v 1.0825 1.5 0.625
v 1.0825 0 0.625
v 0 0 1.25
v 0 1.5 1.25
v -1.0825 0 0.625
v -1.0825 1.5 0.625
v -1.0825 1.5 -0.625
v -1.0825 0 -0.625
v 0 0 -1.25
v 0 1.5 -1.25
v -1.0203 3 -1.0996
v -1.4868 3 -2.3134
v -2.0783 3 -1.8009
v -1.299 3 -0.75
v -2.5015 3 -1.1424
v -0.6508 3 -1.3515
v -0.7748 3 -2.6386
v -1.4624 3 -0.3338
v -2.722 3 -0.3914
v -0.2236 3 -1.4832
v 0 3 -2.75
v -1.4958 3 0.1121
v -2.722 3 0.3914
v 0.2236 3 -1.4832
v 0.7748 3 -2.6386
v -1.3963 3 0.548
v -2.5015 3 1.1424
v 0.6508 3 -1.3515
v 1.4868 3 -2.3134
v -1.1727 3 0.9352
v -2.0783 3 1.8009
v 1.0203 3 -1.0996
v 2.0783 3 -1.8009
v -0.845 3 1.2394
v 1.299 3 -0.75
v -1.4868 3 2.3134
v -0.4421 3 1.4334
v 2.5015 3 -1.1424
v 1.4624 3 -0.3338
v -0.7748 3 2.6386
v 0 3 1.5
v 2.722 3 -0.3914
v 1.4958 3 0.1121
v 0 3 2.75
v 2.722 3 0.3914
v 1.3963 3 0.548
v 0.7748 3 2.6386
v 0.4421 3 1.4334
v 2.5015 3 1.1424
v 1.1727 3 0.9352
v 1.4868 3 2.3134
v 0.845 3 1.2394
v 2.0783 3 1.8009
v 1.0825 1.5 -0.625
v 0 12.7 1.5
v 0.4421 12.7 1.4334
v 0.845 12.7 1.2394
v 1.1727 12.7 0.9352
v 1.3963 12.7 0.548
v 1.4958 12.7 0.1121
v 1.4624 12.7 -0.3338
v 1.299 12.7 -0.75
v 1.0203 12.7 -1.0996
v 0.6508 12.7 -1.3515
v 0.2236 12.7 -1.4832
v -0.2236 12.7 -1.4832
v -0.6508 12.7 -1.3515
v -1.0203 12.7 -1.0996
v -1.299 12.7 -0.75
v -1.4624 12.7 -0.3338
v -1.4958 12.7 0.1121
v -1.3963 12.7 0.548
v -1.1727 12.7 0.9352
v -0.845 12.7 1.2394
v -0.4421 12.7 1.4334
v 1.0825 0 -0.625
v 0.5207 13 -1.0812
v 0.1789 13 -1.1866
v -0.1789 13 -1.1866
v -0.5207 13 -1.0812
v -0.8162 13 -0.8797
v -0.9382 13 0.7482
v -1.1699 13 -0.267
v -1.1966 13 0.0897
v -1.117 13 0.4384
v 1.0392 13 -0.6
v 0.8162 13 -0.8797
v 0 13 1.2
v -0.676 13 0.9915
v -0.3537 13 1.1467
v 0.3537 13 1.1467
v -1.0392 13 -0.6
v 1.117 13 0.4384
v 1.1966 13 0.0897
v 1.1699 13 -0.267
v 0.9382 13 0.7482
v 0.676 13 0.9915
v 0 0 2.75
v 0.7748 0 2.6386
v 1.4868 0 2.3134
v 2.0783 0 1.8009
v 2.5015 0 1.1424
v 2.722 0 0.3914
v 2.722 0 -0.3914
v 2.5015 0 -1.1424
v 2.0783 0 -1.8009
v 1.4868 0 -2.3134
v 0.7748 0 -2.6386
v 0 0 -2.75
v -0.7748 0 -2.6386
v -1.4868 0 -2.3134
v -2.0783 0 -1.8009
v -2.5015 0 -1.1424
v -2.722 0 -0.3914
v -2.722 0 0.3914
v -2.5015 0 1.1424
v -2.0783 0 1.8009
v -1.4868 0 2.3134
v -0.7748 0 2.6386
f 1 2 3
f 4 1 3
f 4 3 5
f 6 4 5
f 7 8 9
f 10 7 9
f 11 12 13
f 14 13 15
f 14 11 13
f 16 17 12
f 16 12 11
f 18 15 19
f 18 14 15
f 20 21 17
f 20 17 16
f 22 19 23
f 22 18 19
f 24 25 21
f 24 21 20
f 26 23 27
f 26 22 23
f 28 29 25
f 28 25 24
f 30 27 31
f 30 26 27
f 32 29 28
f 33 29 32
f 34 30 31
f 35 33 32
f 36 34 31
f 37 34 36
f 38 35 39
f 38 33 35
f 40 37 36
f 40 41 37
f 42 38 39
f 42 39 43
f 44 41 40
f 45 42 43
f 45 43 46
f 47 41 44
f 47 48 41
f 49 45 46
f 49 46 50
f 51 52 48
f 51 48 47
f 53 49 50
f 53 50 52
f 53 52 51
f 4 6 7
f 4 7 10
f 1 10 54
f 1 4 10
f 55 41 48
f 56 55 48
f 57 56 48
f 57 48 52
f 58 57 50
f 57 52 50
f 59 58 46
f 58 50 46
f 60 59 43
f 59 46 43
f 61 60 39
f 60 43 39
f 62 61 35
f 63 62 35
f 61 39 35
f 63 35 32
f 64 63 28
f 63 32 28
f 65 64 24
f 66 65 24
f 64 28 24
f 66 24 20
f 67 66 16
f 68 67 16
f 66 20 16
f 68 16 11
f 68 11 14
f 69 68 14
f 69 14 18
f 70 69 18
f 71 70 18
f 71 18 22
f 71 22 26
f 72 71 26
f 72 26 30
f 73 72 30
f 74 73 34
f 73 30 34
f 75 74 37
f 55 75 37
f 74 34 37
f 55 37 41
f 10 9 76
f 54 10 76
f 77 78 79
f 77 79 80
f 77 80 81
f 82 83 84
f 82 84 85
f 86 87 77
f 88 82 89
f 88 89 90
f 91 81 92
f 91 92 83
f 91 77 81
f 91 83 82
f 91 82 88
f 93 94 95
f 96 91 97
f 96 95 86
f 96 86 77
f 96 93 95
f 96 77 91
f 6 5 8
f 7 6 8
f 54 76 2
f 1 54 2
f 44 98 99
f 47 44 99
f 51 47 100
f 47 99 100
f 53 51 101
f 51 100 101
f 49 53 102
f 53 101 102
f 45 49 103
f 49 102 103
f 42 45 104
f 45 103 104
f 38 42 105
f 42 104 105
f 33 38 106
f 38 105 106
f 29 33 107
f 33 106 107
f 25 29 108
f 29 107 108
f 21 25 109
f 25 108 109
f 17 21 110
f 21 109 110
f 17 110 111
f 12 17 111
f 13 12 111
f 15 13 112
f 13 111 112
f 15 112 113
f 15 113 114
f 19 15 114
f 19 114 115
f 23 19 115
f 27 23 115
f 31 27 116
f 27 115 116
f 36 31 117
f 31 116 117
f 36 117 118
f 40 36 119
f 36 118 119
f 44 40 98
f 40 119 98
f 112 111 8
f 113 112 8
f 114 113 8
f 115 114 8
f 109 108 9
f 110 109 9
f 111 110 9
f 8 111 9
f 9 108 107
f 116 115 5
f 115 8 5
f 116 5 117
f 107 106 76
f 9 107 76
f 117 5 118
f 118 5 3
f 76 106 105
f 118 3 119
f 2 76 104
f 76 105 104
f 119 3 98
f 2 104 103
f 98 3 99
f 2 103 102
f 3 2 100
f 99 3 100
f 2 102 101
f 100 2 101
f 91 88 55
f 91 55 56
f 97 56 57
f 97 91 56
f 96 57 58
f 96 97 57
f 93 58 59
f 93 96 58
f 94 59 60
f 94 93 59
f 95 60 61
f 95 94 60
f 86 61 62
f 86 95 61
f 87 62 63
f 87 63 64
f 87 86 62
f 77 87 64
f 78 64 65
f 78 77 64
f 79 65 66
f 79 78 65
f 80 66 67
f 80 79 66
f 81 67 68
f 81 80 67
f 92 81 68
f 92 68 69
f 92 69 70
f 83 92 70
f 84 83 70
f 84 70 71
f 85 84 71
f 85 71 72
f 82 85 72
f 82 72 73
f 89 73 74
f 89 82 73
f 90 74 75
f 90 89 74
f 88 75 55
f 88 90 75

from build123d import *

# Parameters (mm, degrees)
SKETCH_1_R          = 2.75
EXTRUDE_1_DEPTH     = 3
CUT_EXTRUDE_1_DEPTH = 1.5
SKETCH_2_R          = 1.5
EXTRUDE_2_DEPTH     = 10
CHAMFER_1_SIZE      = 0.3


with BuildPart() as part:
    # 草图1 → 凸台-拉伸1 (new body)
    with BuildSketch(Plane(origin=(0, 0, 0), x_dir=(1, 0, 0), z_dir=(0, 1, 0))):
        with Locations(Location((0, 0, 0), (0, 0, 270))):
            Circle(SKETCH_1_R)
    extrude(amount=EXTRUDE_1_DEPTH)

    # 草图3 → 切除-拉伸1 (cut)
    with BuildSketch(Plane.XZ):
        Polygon((0, 1.25), (-1.082531755, 0.625), (-1.082531755, -0.625), (0, -1.25), (1.082531755, -0.625), (1.082531755, 0.625), align=None)
    extrude(amount=-CUT_EXTRUDE_1_DEPTH, mode=Mode.SUBTRACT)

    # 草图2 → 凸台-拉伸2 (add)
    with BuildSketch(Plane(origin=(0, 3, 0), x_dir=(1, 0, 0), z_dir=(0, 1, 0))):
        with Locations(Location((0, 0, 0), (0, 0, 270))):
            Circle(SKETCH_2_R)
    extrude(amount=EXTRUDE_2_DEPTH)

    # 倒角1
    chamfer_1_edges = [part.edges().sort_by_distance(p)[0] for p in [
        (0, 13, -1.5),
    ]]
    chamfer(chamfer_1_edges, length=CHAMFER_1_SIZE)


solid = part.part
